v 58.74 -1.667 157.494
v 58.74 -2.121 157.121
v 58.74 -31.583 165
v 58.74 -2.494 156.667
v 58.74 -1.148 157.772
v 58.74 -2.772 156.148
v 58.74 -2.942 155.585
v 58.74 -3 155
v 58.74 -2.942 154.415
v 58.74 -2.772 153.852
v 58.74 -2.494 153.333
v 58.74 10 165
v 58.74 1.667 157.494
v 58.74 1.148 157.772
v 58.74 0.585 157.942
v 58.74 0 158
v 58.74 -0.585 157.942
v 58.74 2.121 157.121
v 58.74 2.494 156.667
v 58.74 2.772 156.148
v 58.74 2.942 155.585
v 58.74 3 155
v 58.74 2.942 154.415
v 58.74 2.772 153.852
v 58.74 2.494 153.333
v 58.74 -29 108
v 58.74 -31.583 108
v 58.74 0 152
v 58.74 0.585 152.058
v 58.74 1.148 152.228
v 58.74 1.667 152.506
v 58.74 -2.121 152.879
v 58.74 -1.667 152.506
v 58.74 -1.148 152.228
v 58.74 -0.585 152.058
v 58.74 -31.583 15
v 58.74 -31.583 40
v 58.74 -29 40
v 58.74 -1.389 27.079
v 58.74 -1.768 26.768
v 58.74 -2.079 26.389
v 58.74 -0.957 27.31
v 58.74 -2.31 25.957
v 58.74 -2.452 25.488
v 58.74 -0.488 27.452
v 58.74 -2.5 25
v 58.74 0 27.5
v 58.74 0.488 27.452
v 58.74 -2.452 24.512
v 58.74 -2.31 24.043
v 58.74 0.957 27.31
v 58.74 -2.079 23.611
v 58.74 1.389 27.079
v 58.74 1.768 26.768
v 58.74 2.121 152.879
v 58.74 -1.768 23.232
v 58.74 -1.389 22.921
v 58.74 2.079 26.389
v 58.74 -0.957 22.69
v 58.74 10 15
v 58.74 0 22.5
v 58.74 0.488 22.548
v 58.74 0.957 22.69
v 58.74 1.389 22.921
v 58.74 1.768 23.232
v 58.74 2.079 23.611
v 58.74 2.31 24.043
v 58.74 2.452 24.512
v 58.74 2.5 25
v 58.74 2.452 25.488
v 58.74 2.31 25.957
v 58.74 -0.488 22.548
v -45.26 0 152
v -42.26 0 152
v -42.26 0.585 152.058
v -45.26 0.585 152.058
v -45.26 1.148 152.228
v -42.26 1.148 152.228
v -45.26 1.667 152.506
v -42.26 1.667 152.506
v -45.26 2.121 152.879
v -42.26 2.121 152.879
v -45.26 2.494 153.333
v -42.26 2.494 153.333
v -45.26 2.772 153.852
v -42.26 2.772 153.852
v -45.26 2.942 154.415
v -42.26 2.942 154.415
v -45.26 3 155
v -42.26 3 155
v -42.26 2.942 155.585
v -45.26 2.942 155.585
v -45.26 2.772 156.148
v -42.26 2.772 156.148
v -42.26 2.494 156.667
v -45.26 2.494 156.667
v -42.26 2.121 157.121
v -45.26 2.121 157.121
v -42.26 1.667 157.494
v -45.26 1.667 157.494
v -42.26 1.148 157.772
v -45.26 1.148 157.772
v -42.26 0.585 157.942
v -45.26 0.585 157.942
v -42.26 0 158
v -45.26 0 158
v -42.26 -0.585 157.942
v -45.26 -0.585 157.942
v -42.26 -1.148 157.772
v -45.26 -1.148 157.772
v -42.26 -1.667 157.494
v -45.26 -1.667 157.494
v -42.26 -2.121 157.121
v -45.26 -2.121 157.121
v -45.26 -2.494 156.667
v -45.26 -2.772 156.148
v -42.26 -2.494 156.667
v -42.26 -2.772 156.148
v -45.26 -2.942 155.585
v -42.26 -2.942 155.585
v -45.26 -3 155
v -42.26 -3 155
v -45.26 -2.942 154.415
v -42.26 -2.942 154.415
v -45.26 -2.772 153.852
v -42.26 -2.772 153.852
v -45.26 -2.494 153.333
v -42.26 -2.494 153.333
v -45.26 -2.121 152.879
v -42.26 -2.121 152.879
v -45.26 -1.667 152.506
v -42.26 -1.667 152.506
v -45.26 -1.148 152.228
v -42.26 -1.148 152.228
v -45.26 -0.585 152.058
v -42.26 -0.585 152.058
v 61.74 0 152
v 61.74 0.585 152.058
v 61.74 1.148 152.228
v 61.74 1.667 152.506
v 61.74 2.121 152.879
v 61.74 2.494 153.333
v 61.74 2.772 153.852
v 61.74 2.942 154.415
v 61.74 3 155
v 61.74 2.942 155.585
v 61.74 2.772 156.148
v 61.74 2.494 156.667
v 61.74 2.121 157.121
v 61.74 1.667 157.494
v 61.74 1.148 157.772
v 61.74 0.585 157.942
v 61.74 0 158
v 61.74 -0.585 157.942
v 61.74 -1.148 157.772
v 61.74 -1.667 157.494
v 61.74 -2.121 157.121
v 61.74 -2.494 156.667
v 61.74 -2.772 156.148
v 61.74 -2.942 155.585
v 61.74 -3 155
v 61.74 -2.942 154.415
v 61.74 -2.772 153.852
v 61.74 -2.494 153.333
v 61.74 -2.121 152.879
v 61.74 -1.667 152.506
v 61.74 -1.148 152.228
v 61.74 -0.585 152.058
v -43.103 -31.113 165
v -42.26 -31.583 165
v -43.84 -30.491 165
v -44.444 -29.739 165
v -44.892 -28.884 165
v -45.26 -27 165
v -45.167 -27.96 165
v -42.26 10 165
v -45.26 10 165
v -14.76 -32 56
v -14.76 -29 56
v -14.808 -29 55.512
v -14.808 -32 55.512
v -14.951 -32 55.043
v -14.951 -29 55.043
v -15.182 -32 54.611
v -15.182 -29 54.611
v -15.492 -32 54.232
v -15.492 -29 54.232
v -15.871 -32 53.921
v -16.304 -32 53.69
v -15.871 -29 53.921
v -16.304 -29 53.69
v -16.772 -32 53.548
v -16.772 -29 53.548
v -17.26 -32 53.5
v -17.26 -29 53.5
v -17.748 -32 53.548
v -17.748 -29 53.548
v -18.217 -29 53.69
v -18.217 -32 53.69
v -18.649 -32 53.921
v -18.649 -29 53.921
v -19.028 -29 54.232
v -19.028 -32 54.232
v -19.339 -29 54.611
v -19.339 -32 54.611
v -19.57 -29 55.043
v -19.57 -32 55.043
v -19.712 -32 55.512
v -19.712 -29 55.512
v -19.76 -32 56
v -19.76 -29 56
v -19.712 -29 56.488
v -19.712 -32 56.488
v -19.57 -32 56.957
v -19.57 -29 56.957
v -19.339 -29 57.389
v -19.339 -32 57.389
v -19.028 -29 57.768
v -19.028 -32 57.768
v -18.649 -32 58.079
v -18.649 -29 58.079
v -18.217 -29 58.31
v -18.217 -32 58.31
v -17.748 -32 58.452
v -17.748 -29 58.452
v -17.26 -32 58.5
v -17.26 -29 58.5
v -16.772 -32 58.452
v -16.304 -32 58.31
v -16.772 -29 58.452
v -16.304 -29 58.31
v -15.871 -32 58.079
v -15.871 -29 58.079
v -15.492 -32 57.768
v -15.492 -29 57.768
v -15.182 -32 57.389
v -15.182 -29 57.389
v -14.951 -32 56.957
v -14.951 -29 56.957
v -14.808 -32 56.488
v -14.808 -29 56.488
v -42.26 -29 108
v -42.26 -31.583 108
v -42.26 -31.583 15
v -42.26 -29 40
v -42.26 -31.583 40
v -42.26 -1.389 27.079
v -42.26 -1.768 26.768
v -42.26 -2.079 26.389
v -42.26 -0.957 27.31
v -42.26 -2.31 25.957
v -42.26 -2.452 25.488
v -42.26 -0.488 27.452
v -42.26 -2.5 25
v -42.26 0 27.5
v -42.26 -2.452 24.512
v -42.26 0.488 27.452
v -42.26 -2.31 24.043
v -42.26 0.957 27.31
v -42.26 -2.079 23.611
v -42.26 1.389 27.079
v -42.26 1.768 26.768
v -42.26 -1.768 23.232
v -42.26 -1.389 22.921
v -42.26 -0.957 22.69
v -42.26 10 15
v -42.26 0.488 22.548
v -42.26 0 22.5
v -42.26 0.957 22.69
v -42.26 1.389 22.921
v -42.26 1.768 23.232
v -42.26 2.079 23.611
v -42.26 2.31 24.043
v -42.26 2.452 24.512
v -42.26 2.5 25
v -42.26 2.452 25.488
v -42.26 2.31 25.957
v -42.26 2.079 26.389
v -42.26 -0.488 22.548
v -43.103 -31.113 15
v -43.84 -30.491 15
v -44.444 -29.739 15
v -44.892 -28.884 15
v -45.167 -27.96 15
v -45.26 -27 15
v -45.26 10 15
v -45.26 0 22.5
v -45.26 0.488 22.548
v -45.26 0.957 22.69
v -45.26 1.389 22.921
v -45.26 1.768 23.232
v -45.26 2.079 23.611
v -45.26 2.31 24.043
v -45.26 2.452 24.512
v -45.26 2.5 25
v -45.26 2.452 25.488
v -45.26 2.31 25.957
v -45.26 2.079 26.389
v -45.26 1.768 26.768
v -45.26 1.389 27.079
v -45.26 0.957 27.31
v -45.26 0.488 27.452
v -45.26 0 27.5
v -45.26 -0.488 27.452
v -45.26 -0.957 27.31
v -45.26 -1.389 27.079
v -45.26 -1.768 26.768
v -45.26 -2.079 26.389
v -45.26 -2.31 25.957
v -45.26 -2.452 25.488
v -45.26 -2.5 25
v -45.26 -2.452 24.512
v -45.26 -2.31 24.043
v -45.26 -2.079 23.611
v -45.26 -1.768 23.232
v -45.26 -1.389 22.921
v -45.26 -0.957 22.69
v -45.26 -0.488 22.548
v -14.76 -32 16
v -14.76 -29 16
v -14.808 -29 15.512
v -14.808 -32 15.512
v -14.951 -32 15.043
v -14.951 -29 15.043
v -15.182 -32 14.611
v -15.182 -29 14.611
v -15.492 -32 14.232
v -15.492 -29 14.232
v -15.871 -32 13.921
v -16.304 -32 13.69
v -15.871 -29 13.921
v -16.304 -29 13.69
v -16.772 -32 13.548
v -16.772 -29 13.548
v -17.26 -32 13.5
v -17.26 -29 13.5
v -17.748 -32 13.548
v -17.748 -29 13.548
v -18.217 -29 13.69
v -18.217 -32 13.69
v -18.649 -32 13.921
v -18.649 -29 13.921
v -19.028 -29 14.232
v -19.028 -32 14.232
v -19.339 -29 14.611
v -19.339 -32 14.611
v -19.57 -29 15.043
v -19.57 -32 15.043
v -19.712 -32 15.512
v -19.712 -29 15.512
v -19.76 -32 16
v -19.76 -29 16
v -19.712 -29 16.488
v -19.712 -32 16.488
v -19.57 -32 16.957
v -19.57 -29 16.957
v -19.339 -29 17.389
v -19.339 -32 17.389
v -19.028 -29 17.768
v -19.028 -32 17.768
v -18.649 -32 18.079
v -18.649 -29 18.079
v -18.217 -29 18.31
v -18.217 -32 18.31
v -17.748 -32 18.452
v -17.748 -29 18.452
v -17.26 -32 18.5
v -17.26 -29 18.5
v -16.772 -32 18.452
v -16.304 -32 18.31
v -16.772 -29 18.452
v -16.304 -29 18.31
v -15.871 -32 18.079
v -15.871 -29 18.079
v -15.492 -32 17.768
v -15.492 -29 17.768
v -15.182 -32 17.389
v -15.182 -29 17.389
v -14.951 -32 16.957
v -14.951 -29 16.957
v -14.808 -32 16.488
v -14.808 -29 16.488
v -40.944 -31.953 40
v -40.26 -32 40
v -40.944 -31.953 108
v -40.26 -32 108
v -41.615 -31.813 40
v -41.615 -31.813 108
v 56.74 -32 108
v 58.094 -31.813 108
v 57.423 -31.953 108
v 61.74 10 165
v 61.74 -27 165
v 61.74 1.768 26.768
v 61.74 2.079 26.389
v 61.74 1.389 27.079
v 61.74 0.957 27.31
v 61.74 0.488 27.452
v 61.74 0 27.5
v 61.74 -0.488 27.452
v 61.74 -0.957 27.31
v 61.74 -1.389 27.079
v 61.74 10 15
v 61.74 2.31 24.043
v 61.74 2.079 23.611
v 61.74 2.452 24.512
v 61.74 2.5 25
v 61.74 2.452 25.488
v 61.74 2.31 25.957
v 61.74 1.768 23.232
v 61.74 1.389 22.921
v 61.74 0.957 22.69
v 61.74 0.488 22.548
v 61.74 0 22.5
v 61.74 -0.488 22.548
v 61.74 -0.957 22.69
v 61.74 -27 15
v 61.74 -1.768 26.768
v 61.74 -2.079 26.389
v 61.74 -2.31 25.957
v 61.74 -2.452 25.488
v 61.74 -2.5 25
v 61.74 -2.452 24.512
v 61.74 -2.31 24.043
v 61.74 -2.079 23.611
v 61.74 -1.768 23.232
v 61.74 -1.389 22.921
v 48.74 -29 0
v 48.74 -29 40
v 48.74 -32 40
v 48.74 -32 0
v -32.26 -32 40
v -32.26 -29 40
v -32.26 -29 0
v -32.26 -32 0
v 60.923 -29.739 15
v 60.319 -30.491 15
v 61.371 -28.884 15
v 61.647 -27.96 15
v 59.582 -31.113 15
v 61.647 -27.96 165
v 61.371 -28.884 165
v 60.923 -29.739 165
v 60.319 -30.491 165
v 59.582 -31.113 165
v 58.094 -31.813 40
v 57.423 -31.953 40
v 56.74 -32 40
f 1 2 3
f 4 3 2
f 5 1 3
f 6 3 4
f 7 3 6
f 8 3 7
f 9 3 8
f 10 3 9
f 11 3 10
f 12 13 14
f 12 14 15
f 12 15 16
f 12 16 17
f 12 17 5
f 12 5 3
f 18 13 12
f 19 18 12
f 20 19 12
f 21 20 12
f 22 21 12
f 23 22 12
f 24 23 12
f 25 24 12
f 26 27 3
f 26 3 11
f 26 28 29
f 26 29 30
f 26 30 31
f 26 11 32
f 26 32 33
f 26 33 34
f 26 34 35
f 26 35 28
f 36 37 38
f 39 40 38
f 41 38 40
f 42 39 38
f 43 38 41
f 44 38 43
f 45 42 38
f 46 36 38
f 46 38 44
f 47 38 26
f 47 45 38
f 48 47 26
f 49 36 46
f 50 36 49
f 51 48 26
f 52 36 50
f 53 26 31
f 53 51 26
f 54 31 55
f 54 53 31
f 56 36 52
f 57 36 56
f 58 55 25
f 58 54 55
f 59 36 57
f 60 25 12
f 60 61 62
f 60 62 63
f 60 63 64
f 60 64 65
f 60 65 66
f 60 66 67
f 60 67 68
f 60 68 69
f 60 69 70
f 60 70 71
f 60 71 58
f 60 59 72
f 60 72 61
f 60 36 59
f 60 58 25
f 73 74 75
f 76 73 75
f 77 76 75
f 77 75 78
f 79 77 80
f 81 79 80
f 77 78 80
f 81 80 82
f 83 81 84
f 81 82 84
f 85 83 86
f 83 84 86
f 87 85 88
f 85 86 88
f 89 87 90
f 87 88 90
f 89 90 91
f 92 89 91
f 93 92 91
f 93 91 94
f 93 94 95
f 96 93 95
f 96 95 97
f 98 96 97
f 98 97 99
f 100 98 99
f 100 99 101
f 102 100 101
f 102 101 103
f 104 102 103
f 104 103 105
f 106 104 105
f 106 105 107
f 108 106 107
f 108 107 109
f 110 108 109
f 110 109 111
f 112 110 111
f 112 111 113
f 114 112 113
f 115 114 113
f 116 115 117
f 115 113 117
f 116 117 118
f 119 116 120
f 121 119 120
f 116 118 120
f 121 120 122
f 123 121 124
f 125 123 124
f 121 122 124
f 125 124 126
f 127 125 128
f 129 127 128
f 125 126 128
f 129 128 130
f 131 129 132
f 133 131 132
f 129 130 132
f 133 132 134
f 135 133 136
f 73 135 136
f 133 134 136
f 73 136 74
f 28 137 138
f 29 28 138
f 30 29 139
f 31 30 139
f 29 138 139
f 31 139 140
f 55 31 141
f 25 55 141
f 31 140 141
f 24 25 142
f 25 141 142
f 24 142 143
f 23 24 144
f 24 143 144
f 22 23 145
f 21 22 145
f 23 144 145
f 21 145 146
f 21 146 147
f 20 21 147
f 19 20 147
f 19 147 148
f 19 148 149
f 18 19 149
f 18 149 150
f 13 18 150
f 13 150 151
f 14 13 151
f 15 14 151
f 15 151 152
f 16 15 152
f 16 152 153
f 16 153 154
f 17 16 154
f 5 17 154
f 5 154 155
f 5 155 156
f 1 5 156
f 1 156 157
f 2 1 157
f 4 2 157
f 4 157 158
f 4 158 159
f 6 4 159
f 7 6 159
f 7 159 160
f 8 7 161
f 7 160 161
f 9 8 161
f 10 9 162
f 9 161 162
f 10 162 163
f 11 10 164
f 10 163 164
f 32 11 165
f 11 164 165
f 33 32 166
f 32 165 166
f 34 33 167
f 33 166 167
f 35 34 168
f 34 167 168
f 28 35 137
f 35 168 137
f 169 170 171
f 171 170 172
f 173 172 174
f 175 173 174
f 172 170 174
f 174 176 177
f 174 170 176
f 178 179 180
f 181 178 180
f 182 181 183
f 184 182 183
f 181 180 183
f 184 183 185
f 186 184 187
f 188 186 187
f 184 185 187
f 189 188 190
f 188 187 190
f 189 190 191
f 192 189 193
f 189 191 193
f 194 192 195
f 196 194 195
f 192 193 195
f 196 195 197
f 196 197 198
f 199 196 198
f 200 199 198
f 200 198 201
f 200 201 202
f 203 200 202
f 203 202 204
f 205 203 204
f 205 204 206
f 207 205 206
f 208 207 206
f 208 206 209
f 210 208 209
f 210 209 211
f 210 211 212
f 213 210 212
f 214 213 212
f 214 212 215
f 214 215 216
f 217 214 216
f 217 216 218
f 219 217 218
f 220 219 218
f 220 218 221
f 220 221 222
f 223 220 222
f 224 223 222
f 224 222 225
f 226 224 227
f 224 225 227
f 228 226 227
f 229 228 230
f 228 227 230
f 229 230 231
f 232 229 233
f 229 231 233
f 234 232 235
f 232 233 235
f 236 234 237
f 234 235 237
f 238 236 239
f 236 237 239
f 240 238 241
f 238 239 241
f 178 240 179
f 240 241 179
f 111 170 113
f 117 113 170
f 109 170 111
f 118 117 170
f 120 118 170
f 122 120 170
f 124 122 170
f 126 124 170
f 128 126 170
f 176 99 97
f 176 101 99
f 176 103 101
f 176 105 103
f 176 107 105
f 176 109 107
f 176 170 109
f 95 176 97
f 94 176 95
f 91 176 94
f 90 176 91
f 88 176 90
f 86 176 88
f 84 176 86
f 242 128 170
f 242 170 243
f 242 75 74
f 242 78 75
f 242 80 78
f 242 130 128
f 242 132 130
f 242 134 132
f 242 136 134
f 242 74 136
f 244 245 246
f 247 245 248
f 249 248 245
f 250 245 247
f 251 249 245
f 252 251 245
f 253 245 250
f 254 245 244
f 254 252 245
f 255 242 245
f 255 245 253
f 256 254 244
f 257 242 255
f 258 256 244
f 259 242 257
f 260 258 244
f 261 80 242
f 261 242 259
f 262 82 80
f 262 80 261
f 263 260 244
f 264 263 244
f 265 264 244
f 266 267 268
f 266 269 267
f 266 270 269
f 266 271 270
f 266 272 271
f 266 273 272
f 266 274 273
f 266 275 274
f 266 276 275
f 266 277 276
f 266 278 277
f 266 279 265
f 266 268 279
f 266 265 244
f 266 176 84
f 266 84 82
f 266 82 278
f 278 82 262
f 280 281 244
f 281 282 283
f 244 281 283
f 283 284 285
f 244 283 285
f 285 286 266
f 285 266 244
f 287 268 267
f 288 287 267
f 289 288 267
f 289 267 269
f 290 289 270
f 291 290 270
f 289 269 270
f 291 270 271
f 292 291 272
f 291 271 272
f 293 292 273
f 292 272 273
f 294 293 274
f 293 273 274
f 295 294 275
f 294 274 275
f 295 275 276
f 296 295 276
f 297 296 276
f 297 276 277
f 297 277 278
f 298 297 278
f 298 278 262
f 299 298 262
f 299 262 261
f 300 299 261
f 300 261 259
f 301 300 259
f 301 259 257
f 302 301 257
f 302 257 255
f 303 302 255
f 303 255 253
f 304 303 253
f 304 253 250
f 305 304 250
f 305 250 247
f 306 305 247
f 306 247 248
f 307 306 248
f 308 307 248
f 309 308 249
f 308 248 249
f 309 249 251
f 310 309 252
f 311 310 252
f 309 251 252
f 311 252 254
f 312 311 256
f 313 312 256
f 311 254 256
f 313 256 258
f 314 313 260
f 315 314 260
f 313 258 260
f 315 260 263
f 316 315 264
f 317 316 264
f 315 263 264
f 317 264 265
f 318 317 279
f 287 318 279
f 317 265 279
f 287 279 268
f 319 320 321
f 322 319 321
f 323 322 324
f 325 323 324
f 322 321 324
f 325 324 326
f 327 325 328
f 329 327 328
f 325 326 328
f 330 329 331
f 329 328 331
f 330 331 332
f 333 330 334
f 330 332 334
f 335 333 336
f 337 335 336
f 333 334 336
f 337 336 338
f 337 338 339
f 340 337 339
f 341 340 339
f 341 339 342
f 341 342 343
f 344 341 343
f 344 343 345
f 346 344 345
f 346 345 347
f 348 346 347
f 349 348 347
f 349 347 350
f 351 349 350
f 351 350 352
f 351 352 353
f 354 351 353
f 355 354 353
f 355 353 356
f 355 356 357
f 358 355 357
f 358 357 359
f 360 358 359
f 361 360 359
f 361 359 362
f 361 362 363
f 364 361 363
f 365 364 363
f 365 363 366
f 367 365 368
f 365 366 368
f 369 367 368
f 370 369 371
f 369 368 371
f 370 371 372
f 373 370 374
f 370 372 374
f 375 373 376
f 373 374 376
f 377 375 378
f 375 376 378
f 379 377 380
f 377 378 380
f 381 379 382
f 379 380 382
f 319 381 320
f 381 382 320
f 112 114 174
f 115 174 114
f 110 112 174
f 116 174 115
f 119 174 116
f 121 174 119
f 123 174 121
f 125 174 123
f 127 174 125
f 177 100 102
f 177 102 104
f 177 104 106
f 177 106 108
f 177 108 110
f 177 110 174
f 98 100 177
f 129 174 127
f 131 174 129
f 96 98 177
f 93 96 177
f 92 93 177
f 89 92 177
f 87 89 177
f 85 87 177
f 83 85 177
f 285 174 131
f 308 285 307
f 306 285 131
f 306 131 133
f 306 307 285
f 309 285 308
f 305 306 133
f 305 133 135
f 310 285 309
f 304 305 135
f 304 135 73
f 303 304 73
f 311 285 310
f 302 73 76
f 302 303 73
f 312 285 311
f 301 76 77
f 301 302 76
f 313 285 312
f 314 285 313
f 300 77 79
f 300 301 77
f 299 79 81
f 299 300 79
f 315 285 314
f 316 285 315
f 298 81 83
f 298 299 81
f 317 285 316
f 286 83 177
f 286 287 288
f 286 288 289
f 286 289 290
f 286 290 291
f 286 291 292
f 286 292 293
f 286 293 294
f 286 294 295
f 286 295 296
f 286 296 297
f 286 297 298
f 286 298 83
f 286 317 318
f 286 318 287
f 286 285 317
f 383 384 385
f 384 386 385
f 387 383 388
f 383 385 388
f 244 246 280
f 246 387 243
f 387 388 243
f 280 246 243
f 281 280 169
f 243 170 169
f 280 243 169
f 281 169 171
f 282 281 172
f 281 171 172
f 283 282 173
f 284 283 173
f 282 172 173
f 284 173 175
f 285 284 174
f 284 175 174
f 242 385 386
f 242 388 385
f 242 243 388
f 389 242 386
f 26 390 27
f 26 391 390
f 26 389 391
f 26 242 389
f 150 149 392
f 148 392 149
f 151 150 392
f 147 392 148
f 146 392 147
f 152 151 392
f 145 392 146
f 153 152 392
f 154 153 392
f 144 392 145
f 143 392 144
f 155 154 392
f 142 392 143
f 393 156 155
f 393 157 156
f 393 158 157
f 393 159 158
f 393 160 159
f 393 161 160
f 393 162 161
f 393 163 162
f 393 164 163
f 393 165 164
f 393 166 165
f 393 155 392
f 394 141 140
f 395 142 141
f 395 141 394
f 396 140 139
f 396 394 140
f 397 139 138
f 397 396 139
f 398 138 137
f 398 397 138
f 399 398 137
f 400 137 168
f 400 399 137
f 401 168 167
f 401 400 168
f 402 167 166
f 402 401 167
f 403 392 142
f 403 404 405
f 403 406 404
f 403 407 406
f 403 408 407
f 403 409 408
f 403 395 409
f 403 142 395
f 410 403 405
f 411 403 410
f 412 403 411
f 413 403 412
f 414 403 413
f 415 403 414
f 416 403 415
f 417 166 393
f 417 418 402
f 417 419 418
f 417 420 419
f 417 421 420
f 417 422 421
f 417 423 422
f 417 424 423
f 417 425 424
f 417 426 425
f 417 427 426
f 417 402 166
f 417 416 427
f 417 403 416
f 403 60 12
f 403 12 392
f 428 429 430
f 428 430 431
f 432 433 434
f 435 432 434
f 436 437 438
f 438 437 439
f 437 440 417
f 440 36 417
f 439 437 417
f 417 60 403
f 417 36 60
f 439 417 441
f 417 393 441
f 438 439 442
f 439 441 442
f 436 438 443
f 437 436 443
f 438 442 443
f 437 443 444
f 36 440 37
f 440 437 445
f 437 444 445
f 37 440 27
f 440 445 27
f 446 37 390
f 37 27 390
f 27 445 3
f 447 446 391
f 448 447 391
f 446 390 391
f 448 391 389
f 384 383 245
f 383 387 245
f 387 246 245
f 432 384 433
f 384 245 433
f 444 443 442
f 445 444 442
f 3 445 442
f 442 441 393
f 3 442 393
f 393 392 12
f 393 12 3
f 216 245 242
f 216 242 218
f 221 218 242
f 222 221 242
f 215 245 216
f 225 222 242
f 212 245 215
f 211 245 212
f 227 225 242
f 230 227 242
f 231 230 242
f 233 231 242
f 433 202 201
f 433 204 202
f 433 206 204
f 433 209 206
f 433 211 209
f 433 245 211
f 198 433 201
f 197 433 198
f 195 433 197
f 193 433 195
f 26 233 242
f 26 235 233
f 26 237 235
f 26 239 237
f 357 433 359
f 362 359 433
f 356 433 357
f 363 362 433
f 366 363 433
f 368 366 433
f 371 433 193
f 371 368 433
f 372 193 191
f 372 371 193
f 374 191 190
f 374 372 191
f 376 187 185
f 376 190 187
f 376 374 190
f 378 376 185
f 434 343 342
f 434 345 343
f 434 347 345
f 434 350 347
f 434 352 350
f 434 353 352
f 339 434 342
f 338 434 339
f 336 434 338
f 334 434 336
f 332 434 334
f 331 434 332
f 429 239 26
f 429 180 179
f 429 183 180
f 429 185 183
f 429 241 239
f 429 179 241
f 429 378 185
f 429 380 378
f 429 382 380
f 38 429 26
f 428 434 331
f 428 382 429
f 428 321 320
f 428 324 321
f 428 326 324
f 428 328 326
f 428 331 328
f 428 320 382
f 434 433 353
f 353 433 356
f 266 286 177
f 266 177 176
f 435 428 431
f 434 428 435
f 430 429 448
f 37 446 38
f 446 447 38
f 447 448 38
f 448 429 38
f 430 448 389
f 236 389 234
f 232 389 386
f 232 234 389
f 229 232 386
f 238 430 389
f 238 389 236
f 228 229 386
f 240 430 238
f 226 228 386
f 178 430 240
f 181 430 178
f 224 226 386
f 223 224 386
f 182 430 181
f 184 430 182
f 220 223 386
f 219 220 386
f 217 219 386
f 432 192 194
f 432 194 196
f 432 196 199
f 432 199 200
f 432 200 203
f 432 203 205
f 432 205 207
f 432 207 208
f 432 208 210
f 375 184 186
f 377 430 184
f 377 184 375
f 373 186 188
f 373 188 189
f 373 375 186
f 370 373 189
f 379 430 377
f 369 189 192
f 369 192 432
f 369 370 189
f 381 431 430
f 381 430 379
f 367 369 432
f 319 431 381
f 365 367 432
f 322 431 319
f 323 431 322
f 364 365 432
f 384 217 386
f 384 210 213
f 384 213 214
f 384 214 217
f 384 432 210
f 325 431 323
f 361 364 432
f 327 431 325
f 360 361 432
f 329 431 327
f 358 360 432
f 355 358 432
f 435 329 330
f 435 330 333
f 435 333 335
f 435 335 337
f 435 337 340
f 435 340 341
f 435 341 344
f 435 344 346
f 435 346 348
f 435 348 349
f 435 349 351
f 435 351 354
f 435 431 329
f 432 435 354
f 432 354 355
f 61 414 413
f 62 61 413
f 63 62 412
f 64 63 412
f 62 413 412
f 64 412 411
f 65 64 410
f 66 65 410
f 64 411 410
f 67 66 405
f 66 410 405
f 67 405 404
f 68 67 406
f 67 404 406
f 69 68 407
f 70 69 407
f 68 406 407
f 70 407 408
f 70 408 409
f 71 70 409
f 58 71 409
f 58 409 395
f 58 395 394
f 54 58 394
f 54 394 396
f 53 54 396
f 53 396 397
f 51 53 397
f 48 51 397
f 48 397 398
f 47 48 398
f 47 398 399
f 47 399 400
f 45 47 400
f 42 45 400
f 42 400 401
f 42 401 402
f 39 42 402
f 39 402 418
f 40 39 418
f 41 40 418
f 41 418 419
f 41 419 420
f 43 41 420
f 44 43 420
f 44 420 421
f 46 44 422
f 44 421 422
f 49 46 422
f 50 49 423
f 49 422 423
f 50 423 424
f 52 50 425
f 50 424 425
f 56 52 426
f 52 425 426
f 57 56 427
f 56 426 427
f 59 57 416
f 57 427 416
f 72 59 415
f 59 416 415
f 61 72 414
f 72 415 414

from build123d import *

# Parameters (mm, degrees)
SALIENTE_EXTRUIR1_DEPTH = 165
CROQUIS3_W              = 10
CROQUIS3_H              = 40
CORTAR_EXTRUIR1_DEPTH   = 165
CROQUIS4_W              = 3
CROQUIS4_H              = 15
CORTAR_EXTRUIR2_DEPTH   = 165
CROQUIS5_W              = 101
CROQUIS5_H              = 57
CORTAR_EXTRUIR3_DEPTH   = 165
CROQUIS6_R              = 2.5
CORTAR_EXTRUIR4_DEPTH   = 165
REDONDEO1_R             = 5
CROQUIS7_R              = 3
CORTAR_EXTRUIR5_DEPTH   = 110
CROQUIS8_R              = 2.5
CORTAR_EXTRUIR6_DEPTH   = 10


with BuildPart() as part:
    # Croquis2 → Saliente-Extruir1 (new body)
    with BuildSketch(Plane.XY):
        Polygon((61.739775044, 10), (61.739775044, -32), (-45.260224956, -32), (-45.260224956, 10), (-42.260224956, 10), (-42.260224956, -29), (58.739775044, -29), (58.739775044, 10), align=None)
    extrude(amount=SALIENTE_EXTRUIR1_DEPTH)

    # Croquis3 → Cortar-Extruir1 (cut)
    with BuildSketch(Plane(origin=(0, -29, 0), x_dir=(1, 0, 0), z_dir=(0, 1, 0))):
        with Locations((-37.260224956, -20)):
            Rectangle(CROQUIS3_W, CROQUIS3_H)
        with Locations((53.739775044, -20)):
            Rectangle(CROQUIS3_W, CROQUIS3_H)
    extrude(amount=-CORTAR_EXTRUIR1_DEPTH, mode=Mode.SUBTRACT)

    # Croquis4 → Cortar-Extruir2 (cut)
    with BuildSketch(Plane(origin=(0, 10, 0), x_dir=(1, 0, 0), z_dir=(0, 1, 0))):
        with Locations((-43.760224956, -7.5)):
            Rectangle(CROQUIS4_W, CROQUIS4_H)
        with Locations((60.239775044, -7.5)):
            Rectangle(CROQUIS4_W, CROQUIS4_H)
    extrude(amount=-CORTAR_EXTRUIR2_DEPTH, mode=Mode.SUBTRACT)

    # Croquis5 → Cortar-Extruir3 (cut)
    with BuildSketch(Plane(origin=(0, -29, 0), x_dir=(1, 0, 0), z_dir=(0, 1, 0))):
        with Locations((8.239775044, -136.5)):
            Rectangle(CROQUIS5_W, CROQUIS5_H)
    extrude(amount=-CORTAR_EXTRUIR3_DEPTH, mode=Mode.SUBTRACT)

    # Croquis6 → Cortar-Extruir4 (cut)
    with BuildSketch(Plane(origin=(61.739775044, 0, 0), x_dir=(0, 0, -1), z_dir=(1, 0, 0))):
        with Locations((-25, 0)):
            Circle(CROQUIS6_R)
        with Locations((-155, 0)):
            Circle(CROQUIS6_R)
    extrude(amount=-CORTAR_EXTRUIR4_DEPTH, mode=Mode.SUBTRACT)

    # Redondeo1
    redondeo1_edges = [part.edges().sort_by_distance(p)[0] for p in [
        (61.739775044, -32, 90),
        (-45.260224956, -32, 90),
    ]]
    fillet(redondeo1_edges, radius=REDONDEO1_R)

    # Croquis7 → Cortar-Extruir5 (cut)
    with BuildSketch(Plane(origin=(61.739775044, 0, 0), x_dir=(0, 0, -1), z_dir=(1, 0, 0))):
        with Locations((-155, 0)):
            Circle(CROQUIS7_R)
    extrude(amount=-CORTAR_EXTRUIR5_DEPTH, mode=Mode.SUBTRACT)

    # Croquis8 → Cortar-Extruir6 (cut)
    with BuildSketch(Plane(origin=(0, -29, 0), x_dir=(1, 0, 0), z_dir=(0, 1, 0))):
        with Locations((-17.260224956, -16)):
            Circle(CROQUIS8_R)
        with Locations((-17.260224956, -56)):
            Circle(CROQUIS8_R)
    extrude(amount=-CORTAR_EXTRUIR6_DEPTH, mode=Mode.SUBTRACT)


solid = part.part
